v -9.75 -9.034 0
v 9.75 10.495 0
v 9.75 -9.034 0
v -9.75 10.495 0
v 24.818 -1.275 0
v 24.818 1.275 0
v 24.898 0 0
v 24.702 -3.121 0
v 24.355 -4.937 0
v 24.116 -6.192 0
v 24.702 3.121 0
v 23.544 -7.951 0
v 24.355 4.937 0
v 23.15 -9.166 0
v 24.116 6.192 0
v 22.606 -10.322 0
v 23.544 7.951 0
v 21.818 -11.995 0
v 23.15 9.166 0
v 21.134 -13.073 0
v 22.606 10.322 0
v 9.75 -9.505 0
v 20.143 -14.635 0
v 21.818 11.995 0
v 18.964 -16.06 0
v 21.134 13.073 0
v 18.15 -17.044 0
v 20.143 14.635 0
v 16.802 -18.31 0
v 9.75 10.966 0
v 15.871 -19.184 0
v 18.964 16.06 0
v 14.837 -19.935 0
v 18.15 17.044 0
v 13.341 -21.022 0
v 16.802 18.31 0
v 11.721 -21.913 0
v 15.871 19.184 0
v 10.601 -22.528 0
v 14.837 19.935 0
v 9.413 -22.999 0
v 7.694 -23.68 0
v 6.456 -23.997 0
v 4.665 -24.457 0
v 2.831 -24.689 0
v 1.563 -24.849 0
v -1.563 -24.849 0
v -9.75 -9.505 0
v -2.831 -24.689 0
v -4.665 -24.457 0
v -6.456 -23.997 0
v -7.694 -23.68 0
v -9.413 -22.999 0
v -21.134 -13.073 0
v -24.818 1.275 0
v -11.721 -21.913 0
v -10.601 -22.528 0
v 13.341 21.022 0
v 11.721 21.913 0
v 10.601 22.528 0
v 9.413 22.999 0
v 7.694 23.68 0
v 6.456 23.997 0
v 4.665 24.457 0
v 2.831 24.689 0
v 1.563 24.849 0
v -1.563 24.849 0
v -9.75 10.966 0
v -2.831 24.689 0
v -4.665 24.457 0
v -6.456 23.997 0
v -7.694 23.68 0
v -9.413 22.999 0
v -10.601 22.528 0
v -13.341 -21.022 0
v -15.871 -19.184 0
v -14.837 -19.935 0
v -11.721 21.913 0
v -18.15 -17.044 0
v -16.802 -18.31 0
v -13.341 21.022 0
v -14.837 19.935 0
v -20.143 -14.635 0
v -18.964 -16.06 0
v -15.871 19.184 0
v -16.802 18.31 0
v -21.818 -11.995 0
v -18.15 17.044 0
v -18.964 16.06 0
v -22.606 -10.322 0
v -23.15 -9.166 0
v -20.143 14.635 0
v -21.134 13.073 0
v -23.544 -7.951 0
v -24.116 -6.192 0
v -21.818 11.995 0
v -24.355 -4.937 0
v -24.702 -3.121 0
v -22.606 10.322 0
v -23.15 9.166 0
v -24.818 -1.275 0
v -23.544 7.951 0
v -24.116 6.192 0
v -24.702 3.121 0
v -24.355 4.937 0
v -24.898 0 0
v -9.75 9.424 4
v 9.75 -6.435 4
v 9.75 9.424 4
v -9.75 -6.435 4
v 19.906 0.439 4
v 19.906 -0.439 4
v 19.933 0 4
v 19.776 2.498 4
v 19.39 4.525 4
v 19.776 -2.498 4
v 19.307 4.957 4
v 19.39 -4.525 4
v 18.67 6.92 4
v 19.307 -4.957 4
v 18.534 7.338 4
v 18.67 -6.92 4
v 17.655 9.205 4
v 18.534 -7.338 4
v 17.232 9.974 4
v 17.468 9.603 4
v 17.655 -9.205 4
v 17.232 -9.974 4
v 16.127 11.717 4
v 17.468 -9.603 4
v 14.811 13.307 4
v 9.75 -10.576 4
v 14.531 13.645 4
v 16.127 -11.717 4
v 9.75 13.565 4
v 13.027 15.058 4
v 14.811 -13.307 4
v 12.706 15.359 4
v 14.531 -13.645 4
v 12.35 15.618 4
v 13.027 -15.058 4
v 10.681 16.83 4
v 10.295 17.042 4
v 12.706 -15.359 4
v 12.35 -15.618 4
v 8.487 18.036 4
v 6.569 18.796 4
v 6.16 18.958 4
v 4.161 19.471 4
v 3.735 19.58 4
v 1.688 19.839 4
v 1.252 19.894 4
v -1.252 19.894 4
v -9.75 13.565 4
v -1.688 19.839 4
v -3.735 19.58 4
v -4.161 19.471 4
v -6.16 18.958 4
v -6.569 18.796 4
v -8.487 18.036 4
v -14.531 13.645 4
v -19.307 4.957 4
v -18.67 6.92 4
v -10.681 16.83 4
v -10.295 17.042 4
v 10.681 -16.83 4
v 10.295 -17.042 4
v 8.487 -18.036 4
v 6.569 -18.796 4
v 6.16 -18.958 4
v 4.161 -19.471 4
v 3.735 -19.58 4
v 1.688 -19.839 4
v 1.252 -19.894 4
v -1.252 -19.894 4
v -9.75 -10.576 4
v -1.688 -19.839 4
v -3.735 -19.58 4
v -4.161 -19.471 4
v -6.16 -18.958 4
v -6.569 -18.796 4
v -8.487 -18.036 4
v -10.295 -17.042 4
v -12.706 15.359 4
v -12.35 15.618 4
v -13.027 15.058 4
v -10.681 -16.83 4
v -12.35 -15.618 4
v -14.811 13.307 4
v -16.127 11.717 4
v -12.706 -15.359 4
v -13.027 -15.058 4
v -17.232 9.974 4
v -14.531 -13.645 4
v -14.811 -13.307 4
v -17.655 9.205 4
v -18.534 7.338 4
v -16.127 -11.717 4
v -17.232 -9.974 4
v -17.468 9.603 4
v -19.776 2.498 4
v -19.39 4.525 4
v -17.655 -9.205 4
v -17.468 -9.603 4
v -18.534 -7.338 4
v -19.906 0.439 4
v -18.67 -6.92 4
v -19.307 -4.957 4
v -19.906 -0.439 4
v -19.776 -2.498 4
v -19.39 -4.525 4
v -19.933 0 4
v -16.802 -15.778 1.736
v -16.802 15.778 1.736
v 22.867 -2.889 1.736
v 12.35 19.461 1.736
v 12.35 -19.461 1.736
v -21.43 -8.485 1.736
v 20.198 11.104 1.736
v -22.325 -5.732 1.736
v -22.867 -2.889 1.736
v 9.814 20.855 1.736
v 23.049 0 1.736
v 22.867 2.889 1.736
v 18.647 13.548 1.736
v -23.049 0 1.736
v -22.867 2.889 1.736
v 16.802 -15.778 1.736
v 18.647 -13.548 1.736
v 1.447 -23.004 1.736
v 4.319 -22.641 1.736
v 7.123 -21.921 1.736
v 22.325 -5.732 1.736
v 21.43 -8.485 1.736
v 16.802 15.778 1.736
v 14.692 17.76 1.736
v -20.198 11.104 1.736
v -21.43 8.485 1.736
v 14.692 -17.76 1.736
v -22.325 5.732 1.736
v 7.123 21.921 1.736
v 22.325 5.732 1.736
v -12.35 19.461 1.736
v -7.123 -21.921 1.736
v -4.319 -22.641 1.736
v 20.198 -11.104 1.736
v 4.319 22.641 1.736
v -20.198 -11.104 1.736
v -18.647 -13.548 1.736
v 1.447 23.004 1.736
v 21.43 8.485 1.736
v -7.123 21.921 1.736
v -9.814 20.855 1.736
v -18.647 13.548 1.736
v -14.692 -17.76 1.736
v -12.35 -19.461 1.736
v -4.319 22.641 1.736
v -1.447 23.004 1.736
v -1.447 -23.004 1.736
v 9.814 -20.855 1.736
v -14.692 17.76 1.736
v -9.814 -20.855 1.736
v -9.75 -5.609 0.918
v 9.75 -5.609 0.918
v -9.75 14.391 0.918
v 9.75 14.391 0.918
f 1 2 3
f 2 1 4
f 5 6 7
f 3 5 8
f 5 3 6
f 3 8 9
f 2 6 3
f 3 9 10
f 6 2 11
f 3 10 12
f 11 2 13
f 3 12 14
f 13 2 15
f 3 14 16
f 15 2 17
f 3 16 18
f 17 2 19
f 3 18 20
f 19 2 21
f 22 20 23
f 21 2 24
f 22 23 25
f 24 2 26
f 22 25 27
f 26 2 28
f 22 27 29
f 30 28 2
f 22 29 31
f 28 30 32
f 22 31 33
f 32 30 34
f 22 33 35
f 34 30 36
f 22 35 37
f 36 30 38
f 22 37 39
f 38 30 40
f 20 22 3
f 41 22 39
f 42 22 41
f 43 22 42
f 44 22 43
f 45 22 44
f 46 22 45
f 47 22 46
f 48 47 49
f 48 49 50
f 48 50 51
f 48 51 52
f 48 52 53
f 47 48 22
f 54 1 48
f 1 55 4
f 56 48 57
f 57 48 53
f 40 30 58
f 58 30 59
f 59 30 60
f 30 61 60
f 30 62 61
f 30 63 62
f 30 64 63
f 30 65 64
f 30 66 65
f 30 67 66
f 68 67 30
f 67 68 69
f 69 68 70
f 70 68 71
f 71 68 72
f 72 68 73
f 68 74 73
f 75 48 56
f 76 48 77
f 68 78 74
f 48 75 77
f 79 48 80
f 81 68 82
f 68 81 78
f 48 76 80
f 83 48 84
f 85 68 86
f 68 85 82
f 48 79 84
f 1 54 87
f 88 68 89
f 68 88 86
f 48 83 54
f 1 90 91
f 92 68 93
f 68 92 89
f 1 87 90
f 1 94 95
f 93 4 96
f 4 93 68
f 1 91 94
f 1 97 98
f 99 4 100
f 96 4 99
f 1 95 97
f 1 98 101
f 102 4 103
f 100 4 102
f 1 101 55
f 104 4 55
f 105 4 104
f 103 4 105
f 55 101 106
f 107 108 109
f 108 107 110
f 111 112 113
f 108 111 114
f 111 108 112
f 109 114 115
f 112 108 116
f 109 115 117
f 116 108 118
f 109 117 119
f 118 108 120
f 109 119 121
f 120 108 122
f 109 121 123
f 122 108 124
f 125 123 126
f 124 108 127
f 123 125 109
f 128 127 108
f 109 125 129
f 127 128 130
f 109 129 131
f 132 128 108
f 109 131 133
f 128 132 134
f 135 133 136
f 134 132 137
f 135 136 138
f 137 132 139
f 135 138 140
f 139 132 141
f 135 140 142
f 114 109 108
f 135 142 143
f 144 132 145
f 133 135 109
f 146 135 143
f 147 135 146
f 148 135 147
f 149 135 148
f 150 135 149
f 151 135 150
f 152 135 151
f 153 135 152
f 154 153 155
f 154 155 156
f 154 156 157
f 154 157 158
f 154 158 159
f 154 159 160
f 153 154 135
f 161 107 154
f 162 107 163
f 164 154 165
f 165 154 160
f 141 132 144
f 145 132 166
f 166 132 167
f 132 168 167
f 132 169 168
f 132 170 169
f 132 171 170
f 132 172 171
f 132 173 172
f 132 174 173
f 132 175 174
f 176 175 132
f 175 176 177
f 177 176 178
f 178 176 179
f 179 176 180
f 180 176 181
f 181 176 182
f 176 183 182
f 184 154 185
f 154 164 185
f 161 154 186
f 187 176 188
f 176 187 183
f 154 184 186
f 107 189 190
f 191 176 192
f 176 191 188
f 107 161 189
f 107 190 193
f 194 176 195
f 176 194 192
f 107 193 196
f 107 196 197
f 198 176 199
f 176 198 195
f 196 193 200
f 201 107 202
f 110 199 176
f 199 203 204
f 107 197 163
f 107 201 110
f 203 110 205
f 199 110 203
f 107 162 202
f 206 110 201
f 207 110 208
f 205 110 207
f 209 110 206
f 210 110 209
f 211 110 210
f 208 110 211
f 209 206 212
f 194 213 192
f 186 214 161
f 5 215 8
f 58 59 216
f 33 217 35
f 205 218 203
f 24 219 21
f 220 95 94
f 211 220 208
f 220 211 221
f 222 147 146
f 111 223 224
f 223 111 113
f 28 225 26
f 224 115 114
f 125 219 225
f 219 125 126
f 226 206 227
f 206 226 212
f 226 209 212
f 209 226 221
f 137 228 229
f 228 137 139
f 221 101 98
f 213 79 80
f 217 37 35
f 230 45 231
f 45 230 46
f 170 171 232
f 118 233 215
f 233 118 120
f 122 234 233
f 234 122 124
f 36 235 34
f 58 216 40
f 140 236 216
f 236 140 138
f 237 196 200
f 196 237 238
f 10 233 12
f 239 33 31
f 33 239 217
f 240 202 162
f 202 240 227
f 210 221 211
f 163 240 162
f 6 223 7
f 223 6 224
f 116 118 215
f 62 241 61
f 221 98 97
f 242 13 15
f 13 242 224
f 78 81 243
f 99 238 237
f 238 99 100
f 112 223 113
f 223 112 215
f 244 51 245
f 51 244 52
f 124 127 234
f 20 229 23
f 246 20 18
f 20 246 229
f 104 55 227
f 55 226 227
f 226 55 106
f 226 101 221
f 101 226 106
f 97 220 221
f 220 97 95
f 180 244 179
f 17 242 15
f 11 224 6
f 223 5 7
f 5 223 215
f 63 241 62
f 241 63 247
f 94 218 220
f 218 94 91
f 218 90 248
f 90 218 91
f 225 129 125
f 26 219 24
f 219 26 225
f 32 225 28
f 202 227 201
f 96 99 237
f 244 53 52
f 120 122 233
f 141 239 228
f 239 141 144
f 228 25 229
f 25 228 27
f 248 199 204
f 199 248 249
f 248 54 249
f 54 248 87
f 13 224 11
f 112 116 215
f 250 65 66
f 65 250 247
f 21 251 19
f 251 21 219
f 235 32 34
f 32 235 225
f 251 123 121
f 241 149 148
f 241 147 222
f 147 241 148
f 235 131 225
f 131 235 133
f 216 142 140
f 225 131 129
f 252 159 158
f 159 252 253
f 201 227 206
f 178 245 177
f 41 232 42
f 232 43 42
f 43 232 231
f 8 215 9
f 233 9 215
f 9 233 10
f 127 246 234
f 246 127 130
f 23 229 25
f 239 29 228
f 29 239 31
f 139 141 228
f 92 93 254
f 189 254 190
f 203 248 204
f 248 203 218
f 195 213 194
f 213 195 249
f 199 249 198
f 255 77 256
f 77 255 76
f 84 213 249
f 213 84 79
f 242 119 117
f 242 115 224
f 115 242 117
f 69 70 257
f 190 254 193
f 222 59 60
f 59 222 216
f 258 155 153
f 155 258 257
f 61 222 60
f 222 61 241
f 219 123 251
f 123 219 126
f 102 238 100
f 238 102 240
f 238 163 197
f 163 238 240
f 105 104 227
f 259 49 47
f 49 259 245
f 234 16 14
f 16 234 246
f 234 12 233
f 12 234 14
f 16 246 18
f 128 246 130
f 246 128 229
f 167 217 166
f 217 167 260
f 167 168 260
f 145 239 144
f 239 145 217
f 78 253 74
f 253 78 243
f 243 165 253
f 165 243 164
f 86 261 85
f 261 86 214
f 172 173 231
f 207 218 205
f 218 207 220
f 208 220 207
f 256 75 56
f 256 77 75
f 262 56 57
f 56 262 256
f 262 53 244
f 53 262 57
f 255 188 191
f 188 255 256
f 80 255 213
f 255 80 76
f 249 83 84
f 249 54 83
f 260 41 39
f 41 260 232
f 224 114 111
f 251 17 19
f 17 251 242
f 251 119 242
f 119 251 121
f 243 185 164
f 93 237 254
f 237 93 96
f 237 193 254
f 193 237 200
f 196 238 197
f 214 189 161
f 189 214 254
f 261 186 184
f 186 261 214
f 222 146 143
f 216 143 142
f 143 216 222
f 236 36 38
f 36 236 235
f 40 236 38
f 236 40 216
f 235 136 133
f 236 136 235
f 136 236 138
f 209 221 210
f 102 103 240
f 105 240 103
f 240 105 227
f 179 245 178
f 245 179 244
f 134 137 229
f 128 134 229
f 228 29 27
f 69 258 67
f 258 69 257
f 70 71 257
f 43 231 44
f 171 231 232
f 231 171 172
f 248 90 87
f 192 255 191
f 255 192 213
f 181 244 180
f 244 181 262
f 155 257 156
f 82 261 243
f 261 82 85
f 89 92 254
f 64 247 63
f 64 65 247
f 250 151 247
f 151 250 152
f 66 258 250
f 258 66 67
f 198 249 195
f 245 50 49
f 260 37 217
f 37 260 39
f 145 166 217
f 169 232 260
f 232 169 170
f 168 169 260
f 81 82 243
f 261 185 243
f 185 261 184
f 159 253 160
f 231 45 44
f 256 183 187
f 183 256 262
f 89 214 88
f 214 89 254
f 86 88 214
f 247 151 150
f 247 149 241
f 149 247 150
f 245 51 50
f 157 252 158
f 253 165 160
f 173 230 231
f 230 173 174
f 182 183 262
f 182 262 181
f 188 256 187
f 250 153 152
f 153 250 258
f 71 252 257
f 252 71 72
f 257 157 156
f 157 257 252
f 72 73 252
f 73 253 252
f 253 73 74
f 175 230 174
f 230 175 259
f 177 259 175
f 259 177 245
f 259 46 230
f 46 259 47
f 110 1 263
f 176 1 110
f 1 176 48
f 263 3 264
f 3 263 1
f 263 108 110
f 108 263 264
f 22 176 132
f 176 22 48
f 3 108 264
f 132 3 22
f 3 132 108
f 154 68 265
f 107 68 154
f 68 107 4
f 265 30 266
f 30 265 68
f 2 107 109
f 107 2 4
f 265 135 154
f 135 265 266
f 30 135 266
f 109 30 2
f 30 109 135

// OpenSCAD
$fn=50;

// Diameter of the base. 
base_diameter = 50; // [10:200]

// Taper ratio of the base. 0.0 means fully rounded top, 1.0 means straight up.
base_taper = 0.8; // [0.0:0.05:1.0]

// Height of the base
base_height = 4; // [1:0.5:10]

// Width of the tile.
tile_width = 19; // [4:.05:60]

// Thickness of the tile.
tile_tickness = 3.5; // [.25:.05:10]

// Clearance around the tile. Use this when you intend to wrap the tile with a piece of paper.
tile_clearance = 0.25; // [0.0:0.01:1]

// Tile placement
tile_placement = "back to back"; // [single, side by side, back to back]

// Angle at which the tile is tilted.
tile_tilt = 15; // [0:45]

// Vertial offset for tile (from bottom.)
tile_v_offset = 0.4; // [0:0.1:4]

tile_h_offset = sin(tile_tilt) * tile_width * .5;

r_bot = base_diameter / 2;
r_top = (base_diameter * base_taper) / 2;
z_offset = (r_bot * r_bot - 
            r_top * r_top - 
            base_height * base_height) / (2 * base_height);
sphere_radius = sqrt(r_bot * r_bot + z_offset * z_offset);

module tile() {
    translate([0, 0, 500])
    cube([tile_width + tile_clearance * 2, 
          tile_tickness  + tile_clearance * 2, 
          1000], center=true);
}


difference() {
    intersection() { 
        translate([0, 0, base_height/2])
        cylinder(r=r_bot, h=base_height, center=true);

        translate([0,0,-z_offset])
        sphere(r=sphere_radius);
    };
    
    translate([0, 0, tile_v_offset]) {
        if (tile_placement == "single") {
            translate([0, tile_h_offset, 0])
            rotate([tile_tilt, 0, 0]) 
            tile();
        }
        else if (tile_placement == "side by side") {
            translate([-19/2-.5, tile_h_offset, 0]) rotate([tile_tilt,0,0]) tile(19,27,3.5);
            translate([ 19/2+.5, tile_h_offset, 0]) rotate([tile_tilt,0,0]) tile(19,27,3.5);
        }
        else if (tile_placement == "back to back") {
            translate([0, -r_top/2 + tile_h_offset, 0]) rotate([tile_tilt, 0, 0]) tile(19,27,3.5);
            translate([0,  r_top/2 + tile_h_offset, 0]) rotate([tile_tilt, 0, 0]) tile(19,27,3.5);
        }
    }
}
